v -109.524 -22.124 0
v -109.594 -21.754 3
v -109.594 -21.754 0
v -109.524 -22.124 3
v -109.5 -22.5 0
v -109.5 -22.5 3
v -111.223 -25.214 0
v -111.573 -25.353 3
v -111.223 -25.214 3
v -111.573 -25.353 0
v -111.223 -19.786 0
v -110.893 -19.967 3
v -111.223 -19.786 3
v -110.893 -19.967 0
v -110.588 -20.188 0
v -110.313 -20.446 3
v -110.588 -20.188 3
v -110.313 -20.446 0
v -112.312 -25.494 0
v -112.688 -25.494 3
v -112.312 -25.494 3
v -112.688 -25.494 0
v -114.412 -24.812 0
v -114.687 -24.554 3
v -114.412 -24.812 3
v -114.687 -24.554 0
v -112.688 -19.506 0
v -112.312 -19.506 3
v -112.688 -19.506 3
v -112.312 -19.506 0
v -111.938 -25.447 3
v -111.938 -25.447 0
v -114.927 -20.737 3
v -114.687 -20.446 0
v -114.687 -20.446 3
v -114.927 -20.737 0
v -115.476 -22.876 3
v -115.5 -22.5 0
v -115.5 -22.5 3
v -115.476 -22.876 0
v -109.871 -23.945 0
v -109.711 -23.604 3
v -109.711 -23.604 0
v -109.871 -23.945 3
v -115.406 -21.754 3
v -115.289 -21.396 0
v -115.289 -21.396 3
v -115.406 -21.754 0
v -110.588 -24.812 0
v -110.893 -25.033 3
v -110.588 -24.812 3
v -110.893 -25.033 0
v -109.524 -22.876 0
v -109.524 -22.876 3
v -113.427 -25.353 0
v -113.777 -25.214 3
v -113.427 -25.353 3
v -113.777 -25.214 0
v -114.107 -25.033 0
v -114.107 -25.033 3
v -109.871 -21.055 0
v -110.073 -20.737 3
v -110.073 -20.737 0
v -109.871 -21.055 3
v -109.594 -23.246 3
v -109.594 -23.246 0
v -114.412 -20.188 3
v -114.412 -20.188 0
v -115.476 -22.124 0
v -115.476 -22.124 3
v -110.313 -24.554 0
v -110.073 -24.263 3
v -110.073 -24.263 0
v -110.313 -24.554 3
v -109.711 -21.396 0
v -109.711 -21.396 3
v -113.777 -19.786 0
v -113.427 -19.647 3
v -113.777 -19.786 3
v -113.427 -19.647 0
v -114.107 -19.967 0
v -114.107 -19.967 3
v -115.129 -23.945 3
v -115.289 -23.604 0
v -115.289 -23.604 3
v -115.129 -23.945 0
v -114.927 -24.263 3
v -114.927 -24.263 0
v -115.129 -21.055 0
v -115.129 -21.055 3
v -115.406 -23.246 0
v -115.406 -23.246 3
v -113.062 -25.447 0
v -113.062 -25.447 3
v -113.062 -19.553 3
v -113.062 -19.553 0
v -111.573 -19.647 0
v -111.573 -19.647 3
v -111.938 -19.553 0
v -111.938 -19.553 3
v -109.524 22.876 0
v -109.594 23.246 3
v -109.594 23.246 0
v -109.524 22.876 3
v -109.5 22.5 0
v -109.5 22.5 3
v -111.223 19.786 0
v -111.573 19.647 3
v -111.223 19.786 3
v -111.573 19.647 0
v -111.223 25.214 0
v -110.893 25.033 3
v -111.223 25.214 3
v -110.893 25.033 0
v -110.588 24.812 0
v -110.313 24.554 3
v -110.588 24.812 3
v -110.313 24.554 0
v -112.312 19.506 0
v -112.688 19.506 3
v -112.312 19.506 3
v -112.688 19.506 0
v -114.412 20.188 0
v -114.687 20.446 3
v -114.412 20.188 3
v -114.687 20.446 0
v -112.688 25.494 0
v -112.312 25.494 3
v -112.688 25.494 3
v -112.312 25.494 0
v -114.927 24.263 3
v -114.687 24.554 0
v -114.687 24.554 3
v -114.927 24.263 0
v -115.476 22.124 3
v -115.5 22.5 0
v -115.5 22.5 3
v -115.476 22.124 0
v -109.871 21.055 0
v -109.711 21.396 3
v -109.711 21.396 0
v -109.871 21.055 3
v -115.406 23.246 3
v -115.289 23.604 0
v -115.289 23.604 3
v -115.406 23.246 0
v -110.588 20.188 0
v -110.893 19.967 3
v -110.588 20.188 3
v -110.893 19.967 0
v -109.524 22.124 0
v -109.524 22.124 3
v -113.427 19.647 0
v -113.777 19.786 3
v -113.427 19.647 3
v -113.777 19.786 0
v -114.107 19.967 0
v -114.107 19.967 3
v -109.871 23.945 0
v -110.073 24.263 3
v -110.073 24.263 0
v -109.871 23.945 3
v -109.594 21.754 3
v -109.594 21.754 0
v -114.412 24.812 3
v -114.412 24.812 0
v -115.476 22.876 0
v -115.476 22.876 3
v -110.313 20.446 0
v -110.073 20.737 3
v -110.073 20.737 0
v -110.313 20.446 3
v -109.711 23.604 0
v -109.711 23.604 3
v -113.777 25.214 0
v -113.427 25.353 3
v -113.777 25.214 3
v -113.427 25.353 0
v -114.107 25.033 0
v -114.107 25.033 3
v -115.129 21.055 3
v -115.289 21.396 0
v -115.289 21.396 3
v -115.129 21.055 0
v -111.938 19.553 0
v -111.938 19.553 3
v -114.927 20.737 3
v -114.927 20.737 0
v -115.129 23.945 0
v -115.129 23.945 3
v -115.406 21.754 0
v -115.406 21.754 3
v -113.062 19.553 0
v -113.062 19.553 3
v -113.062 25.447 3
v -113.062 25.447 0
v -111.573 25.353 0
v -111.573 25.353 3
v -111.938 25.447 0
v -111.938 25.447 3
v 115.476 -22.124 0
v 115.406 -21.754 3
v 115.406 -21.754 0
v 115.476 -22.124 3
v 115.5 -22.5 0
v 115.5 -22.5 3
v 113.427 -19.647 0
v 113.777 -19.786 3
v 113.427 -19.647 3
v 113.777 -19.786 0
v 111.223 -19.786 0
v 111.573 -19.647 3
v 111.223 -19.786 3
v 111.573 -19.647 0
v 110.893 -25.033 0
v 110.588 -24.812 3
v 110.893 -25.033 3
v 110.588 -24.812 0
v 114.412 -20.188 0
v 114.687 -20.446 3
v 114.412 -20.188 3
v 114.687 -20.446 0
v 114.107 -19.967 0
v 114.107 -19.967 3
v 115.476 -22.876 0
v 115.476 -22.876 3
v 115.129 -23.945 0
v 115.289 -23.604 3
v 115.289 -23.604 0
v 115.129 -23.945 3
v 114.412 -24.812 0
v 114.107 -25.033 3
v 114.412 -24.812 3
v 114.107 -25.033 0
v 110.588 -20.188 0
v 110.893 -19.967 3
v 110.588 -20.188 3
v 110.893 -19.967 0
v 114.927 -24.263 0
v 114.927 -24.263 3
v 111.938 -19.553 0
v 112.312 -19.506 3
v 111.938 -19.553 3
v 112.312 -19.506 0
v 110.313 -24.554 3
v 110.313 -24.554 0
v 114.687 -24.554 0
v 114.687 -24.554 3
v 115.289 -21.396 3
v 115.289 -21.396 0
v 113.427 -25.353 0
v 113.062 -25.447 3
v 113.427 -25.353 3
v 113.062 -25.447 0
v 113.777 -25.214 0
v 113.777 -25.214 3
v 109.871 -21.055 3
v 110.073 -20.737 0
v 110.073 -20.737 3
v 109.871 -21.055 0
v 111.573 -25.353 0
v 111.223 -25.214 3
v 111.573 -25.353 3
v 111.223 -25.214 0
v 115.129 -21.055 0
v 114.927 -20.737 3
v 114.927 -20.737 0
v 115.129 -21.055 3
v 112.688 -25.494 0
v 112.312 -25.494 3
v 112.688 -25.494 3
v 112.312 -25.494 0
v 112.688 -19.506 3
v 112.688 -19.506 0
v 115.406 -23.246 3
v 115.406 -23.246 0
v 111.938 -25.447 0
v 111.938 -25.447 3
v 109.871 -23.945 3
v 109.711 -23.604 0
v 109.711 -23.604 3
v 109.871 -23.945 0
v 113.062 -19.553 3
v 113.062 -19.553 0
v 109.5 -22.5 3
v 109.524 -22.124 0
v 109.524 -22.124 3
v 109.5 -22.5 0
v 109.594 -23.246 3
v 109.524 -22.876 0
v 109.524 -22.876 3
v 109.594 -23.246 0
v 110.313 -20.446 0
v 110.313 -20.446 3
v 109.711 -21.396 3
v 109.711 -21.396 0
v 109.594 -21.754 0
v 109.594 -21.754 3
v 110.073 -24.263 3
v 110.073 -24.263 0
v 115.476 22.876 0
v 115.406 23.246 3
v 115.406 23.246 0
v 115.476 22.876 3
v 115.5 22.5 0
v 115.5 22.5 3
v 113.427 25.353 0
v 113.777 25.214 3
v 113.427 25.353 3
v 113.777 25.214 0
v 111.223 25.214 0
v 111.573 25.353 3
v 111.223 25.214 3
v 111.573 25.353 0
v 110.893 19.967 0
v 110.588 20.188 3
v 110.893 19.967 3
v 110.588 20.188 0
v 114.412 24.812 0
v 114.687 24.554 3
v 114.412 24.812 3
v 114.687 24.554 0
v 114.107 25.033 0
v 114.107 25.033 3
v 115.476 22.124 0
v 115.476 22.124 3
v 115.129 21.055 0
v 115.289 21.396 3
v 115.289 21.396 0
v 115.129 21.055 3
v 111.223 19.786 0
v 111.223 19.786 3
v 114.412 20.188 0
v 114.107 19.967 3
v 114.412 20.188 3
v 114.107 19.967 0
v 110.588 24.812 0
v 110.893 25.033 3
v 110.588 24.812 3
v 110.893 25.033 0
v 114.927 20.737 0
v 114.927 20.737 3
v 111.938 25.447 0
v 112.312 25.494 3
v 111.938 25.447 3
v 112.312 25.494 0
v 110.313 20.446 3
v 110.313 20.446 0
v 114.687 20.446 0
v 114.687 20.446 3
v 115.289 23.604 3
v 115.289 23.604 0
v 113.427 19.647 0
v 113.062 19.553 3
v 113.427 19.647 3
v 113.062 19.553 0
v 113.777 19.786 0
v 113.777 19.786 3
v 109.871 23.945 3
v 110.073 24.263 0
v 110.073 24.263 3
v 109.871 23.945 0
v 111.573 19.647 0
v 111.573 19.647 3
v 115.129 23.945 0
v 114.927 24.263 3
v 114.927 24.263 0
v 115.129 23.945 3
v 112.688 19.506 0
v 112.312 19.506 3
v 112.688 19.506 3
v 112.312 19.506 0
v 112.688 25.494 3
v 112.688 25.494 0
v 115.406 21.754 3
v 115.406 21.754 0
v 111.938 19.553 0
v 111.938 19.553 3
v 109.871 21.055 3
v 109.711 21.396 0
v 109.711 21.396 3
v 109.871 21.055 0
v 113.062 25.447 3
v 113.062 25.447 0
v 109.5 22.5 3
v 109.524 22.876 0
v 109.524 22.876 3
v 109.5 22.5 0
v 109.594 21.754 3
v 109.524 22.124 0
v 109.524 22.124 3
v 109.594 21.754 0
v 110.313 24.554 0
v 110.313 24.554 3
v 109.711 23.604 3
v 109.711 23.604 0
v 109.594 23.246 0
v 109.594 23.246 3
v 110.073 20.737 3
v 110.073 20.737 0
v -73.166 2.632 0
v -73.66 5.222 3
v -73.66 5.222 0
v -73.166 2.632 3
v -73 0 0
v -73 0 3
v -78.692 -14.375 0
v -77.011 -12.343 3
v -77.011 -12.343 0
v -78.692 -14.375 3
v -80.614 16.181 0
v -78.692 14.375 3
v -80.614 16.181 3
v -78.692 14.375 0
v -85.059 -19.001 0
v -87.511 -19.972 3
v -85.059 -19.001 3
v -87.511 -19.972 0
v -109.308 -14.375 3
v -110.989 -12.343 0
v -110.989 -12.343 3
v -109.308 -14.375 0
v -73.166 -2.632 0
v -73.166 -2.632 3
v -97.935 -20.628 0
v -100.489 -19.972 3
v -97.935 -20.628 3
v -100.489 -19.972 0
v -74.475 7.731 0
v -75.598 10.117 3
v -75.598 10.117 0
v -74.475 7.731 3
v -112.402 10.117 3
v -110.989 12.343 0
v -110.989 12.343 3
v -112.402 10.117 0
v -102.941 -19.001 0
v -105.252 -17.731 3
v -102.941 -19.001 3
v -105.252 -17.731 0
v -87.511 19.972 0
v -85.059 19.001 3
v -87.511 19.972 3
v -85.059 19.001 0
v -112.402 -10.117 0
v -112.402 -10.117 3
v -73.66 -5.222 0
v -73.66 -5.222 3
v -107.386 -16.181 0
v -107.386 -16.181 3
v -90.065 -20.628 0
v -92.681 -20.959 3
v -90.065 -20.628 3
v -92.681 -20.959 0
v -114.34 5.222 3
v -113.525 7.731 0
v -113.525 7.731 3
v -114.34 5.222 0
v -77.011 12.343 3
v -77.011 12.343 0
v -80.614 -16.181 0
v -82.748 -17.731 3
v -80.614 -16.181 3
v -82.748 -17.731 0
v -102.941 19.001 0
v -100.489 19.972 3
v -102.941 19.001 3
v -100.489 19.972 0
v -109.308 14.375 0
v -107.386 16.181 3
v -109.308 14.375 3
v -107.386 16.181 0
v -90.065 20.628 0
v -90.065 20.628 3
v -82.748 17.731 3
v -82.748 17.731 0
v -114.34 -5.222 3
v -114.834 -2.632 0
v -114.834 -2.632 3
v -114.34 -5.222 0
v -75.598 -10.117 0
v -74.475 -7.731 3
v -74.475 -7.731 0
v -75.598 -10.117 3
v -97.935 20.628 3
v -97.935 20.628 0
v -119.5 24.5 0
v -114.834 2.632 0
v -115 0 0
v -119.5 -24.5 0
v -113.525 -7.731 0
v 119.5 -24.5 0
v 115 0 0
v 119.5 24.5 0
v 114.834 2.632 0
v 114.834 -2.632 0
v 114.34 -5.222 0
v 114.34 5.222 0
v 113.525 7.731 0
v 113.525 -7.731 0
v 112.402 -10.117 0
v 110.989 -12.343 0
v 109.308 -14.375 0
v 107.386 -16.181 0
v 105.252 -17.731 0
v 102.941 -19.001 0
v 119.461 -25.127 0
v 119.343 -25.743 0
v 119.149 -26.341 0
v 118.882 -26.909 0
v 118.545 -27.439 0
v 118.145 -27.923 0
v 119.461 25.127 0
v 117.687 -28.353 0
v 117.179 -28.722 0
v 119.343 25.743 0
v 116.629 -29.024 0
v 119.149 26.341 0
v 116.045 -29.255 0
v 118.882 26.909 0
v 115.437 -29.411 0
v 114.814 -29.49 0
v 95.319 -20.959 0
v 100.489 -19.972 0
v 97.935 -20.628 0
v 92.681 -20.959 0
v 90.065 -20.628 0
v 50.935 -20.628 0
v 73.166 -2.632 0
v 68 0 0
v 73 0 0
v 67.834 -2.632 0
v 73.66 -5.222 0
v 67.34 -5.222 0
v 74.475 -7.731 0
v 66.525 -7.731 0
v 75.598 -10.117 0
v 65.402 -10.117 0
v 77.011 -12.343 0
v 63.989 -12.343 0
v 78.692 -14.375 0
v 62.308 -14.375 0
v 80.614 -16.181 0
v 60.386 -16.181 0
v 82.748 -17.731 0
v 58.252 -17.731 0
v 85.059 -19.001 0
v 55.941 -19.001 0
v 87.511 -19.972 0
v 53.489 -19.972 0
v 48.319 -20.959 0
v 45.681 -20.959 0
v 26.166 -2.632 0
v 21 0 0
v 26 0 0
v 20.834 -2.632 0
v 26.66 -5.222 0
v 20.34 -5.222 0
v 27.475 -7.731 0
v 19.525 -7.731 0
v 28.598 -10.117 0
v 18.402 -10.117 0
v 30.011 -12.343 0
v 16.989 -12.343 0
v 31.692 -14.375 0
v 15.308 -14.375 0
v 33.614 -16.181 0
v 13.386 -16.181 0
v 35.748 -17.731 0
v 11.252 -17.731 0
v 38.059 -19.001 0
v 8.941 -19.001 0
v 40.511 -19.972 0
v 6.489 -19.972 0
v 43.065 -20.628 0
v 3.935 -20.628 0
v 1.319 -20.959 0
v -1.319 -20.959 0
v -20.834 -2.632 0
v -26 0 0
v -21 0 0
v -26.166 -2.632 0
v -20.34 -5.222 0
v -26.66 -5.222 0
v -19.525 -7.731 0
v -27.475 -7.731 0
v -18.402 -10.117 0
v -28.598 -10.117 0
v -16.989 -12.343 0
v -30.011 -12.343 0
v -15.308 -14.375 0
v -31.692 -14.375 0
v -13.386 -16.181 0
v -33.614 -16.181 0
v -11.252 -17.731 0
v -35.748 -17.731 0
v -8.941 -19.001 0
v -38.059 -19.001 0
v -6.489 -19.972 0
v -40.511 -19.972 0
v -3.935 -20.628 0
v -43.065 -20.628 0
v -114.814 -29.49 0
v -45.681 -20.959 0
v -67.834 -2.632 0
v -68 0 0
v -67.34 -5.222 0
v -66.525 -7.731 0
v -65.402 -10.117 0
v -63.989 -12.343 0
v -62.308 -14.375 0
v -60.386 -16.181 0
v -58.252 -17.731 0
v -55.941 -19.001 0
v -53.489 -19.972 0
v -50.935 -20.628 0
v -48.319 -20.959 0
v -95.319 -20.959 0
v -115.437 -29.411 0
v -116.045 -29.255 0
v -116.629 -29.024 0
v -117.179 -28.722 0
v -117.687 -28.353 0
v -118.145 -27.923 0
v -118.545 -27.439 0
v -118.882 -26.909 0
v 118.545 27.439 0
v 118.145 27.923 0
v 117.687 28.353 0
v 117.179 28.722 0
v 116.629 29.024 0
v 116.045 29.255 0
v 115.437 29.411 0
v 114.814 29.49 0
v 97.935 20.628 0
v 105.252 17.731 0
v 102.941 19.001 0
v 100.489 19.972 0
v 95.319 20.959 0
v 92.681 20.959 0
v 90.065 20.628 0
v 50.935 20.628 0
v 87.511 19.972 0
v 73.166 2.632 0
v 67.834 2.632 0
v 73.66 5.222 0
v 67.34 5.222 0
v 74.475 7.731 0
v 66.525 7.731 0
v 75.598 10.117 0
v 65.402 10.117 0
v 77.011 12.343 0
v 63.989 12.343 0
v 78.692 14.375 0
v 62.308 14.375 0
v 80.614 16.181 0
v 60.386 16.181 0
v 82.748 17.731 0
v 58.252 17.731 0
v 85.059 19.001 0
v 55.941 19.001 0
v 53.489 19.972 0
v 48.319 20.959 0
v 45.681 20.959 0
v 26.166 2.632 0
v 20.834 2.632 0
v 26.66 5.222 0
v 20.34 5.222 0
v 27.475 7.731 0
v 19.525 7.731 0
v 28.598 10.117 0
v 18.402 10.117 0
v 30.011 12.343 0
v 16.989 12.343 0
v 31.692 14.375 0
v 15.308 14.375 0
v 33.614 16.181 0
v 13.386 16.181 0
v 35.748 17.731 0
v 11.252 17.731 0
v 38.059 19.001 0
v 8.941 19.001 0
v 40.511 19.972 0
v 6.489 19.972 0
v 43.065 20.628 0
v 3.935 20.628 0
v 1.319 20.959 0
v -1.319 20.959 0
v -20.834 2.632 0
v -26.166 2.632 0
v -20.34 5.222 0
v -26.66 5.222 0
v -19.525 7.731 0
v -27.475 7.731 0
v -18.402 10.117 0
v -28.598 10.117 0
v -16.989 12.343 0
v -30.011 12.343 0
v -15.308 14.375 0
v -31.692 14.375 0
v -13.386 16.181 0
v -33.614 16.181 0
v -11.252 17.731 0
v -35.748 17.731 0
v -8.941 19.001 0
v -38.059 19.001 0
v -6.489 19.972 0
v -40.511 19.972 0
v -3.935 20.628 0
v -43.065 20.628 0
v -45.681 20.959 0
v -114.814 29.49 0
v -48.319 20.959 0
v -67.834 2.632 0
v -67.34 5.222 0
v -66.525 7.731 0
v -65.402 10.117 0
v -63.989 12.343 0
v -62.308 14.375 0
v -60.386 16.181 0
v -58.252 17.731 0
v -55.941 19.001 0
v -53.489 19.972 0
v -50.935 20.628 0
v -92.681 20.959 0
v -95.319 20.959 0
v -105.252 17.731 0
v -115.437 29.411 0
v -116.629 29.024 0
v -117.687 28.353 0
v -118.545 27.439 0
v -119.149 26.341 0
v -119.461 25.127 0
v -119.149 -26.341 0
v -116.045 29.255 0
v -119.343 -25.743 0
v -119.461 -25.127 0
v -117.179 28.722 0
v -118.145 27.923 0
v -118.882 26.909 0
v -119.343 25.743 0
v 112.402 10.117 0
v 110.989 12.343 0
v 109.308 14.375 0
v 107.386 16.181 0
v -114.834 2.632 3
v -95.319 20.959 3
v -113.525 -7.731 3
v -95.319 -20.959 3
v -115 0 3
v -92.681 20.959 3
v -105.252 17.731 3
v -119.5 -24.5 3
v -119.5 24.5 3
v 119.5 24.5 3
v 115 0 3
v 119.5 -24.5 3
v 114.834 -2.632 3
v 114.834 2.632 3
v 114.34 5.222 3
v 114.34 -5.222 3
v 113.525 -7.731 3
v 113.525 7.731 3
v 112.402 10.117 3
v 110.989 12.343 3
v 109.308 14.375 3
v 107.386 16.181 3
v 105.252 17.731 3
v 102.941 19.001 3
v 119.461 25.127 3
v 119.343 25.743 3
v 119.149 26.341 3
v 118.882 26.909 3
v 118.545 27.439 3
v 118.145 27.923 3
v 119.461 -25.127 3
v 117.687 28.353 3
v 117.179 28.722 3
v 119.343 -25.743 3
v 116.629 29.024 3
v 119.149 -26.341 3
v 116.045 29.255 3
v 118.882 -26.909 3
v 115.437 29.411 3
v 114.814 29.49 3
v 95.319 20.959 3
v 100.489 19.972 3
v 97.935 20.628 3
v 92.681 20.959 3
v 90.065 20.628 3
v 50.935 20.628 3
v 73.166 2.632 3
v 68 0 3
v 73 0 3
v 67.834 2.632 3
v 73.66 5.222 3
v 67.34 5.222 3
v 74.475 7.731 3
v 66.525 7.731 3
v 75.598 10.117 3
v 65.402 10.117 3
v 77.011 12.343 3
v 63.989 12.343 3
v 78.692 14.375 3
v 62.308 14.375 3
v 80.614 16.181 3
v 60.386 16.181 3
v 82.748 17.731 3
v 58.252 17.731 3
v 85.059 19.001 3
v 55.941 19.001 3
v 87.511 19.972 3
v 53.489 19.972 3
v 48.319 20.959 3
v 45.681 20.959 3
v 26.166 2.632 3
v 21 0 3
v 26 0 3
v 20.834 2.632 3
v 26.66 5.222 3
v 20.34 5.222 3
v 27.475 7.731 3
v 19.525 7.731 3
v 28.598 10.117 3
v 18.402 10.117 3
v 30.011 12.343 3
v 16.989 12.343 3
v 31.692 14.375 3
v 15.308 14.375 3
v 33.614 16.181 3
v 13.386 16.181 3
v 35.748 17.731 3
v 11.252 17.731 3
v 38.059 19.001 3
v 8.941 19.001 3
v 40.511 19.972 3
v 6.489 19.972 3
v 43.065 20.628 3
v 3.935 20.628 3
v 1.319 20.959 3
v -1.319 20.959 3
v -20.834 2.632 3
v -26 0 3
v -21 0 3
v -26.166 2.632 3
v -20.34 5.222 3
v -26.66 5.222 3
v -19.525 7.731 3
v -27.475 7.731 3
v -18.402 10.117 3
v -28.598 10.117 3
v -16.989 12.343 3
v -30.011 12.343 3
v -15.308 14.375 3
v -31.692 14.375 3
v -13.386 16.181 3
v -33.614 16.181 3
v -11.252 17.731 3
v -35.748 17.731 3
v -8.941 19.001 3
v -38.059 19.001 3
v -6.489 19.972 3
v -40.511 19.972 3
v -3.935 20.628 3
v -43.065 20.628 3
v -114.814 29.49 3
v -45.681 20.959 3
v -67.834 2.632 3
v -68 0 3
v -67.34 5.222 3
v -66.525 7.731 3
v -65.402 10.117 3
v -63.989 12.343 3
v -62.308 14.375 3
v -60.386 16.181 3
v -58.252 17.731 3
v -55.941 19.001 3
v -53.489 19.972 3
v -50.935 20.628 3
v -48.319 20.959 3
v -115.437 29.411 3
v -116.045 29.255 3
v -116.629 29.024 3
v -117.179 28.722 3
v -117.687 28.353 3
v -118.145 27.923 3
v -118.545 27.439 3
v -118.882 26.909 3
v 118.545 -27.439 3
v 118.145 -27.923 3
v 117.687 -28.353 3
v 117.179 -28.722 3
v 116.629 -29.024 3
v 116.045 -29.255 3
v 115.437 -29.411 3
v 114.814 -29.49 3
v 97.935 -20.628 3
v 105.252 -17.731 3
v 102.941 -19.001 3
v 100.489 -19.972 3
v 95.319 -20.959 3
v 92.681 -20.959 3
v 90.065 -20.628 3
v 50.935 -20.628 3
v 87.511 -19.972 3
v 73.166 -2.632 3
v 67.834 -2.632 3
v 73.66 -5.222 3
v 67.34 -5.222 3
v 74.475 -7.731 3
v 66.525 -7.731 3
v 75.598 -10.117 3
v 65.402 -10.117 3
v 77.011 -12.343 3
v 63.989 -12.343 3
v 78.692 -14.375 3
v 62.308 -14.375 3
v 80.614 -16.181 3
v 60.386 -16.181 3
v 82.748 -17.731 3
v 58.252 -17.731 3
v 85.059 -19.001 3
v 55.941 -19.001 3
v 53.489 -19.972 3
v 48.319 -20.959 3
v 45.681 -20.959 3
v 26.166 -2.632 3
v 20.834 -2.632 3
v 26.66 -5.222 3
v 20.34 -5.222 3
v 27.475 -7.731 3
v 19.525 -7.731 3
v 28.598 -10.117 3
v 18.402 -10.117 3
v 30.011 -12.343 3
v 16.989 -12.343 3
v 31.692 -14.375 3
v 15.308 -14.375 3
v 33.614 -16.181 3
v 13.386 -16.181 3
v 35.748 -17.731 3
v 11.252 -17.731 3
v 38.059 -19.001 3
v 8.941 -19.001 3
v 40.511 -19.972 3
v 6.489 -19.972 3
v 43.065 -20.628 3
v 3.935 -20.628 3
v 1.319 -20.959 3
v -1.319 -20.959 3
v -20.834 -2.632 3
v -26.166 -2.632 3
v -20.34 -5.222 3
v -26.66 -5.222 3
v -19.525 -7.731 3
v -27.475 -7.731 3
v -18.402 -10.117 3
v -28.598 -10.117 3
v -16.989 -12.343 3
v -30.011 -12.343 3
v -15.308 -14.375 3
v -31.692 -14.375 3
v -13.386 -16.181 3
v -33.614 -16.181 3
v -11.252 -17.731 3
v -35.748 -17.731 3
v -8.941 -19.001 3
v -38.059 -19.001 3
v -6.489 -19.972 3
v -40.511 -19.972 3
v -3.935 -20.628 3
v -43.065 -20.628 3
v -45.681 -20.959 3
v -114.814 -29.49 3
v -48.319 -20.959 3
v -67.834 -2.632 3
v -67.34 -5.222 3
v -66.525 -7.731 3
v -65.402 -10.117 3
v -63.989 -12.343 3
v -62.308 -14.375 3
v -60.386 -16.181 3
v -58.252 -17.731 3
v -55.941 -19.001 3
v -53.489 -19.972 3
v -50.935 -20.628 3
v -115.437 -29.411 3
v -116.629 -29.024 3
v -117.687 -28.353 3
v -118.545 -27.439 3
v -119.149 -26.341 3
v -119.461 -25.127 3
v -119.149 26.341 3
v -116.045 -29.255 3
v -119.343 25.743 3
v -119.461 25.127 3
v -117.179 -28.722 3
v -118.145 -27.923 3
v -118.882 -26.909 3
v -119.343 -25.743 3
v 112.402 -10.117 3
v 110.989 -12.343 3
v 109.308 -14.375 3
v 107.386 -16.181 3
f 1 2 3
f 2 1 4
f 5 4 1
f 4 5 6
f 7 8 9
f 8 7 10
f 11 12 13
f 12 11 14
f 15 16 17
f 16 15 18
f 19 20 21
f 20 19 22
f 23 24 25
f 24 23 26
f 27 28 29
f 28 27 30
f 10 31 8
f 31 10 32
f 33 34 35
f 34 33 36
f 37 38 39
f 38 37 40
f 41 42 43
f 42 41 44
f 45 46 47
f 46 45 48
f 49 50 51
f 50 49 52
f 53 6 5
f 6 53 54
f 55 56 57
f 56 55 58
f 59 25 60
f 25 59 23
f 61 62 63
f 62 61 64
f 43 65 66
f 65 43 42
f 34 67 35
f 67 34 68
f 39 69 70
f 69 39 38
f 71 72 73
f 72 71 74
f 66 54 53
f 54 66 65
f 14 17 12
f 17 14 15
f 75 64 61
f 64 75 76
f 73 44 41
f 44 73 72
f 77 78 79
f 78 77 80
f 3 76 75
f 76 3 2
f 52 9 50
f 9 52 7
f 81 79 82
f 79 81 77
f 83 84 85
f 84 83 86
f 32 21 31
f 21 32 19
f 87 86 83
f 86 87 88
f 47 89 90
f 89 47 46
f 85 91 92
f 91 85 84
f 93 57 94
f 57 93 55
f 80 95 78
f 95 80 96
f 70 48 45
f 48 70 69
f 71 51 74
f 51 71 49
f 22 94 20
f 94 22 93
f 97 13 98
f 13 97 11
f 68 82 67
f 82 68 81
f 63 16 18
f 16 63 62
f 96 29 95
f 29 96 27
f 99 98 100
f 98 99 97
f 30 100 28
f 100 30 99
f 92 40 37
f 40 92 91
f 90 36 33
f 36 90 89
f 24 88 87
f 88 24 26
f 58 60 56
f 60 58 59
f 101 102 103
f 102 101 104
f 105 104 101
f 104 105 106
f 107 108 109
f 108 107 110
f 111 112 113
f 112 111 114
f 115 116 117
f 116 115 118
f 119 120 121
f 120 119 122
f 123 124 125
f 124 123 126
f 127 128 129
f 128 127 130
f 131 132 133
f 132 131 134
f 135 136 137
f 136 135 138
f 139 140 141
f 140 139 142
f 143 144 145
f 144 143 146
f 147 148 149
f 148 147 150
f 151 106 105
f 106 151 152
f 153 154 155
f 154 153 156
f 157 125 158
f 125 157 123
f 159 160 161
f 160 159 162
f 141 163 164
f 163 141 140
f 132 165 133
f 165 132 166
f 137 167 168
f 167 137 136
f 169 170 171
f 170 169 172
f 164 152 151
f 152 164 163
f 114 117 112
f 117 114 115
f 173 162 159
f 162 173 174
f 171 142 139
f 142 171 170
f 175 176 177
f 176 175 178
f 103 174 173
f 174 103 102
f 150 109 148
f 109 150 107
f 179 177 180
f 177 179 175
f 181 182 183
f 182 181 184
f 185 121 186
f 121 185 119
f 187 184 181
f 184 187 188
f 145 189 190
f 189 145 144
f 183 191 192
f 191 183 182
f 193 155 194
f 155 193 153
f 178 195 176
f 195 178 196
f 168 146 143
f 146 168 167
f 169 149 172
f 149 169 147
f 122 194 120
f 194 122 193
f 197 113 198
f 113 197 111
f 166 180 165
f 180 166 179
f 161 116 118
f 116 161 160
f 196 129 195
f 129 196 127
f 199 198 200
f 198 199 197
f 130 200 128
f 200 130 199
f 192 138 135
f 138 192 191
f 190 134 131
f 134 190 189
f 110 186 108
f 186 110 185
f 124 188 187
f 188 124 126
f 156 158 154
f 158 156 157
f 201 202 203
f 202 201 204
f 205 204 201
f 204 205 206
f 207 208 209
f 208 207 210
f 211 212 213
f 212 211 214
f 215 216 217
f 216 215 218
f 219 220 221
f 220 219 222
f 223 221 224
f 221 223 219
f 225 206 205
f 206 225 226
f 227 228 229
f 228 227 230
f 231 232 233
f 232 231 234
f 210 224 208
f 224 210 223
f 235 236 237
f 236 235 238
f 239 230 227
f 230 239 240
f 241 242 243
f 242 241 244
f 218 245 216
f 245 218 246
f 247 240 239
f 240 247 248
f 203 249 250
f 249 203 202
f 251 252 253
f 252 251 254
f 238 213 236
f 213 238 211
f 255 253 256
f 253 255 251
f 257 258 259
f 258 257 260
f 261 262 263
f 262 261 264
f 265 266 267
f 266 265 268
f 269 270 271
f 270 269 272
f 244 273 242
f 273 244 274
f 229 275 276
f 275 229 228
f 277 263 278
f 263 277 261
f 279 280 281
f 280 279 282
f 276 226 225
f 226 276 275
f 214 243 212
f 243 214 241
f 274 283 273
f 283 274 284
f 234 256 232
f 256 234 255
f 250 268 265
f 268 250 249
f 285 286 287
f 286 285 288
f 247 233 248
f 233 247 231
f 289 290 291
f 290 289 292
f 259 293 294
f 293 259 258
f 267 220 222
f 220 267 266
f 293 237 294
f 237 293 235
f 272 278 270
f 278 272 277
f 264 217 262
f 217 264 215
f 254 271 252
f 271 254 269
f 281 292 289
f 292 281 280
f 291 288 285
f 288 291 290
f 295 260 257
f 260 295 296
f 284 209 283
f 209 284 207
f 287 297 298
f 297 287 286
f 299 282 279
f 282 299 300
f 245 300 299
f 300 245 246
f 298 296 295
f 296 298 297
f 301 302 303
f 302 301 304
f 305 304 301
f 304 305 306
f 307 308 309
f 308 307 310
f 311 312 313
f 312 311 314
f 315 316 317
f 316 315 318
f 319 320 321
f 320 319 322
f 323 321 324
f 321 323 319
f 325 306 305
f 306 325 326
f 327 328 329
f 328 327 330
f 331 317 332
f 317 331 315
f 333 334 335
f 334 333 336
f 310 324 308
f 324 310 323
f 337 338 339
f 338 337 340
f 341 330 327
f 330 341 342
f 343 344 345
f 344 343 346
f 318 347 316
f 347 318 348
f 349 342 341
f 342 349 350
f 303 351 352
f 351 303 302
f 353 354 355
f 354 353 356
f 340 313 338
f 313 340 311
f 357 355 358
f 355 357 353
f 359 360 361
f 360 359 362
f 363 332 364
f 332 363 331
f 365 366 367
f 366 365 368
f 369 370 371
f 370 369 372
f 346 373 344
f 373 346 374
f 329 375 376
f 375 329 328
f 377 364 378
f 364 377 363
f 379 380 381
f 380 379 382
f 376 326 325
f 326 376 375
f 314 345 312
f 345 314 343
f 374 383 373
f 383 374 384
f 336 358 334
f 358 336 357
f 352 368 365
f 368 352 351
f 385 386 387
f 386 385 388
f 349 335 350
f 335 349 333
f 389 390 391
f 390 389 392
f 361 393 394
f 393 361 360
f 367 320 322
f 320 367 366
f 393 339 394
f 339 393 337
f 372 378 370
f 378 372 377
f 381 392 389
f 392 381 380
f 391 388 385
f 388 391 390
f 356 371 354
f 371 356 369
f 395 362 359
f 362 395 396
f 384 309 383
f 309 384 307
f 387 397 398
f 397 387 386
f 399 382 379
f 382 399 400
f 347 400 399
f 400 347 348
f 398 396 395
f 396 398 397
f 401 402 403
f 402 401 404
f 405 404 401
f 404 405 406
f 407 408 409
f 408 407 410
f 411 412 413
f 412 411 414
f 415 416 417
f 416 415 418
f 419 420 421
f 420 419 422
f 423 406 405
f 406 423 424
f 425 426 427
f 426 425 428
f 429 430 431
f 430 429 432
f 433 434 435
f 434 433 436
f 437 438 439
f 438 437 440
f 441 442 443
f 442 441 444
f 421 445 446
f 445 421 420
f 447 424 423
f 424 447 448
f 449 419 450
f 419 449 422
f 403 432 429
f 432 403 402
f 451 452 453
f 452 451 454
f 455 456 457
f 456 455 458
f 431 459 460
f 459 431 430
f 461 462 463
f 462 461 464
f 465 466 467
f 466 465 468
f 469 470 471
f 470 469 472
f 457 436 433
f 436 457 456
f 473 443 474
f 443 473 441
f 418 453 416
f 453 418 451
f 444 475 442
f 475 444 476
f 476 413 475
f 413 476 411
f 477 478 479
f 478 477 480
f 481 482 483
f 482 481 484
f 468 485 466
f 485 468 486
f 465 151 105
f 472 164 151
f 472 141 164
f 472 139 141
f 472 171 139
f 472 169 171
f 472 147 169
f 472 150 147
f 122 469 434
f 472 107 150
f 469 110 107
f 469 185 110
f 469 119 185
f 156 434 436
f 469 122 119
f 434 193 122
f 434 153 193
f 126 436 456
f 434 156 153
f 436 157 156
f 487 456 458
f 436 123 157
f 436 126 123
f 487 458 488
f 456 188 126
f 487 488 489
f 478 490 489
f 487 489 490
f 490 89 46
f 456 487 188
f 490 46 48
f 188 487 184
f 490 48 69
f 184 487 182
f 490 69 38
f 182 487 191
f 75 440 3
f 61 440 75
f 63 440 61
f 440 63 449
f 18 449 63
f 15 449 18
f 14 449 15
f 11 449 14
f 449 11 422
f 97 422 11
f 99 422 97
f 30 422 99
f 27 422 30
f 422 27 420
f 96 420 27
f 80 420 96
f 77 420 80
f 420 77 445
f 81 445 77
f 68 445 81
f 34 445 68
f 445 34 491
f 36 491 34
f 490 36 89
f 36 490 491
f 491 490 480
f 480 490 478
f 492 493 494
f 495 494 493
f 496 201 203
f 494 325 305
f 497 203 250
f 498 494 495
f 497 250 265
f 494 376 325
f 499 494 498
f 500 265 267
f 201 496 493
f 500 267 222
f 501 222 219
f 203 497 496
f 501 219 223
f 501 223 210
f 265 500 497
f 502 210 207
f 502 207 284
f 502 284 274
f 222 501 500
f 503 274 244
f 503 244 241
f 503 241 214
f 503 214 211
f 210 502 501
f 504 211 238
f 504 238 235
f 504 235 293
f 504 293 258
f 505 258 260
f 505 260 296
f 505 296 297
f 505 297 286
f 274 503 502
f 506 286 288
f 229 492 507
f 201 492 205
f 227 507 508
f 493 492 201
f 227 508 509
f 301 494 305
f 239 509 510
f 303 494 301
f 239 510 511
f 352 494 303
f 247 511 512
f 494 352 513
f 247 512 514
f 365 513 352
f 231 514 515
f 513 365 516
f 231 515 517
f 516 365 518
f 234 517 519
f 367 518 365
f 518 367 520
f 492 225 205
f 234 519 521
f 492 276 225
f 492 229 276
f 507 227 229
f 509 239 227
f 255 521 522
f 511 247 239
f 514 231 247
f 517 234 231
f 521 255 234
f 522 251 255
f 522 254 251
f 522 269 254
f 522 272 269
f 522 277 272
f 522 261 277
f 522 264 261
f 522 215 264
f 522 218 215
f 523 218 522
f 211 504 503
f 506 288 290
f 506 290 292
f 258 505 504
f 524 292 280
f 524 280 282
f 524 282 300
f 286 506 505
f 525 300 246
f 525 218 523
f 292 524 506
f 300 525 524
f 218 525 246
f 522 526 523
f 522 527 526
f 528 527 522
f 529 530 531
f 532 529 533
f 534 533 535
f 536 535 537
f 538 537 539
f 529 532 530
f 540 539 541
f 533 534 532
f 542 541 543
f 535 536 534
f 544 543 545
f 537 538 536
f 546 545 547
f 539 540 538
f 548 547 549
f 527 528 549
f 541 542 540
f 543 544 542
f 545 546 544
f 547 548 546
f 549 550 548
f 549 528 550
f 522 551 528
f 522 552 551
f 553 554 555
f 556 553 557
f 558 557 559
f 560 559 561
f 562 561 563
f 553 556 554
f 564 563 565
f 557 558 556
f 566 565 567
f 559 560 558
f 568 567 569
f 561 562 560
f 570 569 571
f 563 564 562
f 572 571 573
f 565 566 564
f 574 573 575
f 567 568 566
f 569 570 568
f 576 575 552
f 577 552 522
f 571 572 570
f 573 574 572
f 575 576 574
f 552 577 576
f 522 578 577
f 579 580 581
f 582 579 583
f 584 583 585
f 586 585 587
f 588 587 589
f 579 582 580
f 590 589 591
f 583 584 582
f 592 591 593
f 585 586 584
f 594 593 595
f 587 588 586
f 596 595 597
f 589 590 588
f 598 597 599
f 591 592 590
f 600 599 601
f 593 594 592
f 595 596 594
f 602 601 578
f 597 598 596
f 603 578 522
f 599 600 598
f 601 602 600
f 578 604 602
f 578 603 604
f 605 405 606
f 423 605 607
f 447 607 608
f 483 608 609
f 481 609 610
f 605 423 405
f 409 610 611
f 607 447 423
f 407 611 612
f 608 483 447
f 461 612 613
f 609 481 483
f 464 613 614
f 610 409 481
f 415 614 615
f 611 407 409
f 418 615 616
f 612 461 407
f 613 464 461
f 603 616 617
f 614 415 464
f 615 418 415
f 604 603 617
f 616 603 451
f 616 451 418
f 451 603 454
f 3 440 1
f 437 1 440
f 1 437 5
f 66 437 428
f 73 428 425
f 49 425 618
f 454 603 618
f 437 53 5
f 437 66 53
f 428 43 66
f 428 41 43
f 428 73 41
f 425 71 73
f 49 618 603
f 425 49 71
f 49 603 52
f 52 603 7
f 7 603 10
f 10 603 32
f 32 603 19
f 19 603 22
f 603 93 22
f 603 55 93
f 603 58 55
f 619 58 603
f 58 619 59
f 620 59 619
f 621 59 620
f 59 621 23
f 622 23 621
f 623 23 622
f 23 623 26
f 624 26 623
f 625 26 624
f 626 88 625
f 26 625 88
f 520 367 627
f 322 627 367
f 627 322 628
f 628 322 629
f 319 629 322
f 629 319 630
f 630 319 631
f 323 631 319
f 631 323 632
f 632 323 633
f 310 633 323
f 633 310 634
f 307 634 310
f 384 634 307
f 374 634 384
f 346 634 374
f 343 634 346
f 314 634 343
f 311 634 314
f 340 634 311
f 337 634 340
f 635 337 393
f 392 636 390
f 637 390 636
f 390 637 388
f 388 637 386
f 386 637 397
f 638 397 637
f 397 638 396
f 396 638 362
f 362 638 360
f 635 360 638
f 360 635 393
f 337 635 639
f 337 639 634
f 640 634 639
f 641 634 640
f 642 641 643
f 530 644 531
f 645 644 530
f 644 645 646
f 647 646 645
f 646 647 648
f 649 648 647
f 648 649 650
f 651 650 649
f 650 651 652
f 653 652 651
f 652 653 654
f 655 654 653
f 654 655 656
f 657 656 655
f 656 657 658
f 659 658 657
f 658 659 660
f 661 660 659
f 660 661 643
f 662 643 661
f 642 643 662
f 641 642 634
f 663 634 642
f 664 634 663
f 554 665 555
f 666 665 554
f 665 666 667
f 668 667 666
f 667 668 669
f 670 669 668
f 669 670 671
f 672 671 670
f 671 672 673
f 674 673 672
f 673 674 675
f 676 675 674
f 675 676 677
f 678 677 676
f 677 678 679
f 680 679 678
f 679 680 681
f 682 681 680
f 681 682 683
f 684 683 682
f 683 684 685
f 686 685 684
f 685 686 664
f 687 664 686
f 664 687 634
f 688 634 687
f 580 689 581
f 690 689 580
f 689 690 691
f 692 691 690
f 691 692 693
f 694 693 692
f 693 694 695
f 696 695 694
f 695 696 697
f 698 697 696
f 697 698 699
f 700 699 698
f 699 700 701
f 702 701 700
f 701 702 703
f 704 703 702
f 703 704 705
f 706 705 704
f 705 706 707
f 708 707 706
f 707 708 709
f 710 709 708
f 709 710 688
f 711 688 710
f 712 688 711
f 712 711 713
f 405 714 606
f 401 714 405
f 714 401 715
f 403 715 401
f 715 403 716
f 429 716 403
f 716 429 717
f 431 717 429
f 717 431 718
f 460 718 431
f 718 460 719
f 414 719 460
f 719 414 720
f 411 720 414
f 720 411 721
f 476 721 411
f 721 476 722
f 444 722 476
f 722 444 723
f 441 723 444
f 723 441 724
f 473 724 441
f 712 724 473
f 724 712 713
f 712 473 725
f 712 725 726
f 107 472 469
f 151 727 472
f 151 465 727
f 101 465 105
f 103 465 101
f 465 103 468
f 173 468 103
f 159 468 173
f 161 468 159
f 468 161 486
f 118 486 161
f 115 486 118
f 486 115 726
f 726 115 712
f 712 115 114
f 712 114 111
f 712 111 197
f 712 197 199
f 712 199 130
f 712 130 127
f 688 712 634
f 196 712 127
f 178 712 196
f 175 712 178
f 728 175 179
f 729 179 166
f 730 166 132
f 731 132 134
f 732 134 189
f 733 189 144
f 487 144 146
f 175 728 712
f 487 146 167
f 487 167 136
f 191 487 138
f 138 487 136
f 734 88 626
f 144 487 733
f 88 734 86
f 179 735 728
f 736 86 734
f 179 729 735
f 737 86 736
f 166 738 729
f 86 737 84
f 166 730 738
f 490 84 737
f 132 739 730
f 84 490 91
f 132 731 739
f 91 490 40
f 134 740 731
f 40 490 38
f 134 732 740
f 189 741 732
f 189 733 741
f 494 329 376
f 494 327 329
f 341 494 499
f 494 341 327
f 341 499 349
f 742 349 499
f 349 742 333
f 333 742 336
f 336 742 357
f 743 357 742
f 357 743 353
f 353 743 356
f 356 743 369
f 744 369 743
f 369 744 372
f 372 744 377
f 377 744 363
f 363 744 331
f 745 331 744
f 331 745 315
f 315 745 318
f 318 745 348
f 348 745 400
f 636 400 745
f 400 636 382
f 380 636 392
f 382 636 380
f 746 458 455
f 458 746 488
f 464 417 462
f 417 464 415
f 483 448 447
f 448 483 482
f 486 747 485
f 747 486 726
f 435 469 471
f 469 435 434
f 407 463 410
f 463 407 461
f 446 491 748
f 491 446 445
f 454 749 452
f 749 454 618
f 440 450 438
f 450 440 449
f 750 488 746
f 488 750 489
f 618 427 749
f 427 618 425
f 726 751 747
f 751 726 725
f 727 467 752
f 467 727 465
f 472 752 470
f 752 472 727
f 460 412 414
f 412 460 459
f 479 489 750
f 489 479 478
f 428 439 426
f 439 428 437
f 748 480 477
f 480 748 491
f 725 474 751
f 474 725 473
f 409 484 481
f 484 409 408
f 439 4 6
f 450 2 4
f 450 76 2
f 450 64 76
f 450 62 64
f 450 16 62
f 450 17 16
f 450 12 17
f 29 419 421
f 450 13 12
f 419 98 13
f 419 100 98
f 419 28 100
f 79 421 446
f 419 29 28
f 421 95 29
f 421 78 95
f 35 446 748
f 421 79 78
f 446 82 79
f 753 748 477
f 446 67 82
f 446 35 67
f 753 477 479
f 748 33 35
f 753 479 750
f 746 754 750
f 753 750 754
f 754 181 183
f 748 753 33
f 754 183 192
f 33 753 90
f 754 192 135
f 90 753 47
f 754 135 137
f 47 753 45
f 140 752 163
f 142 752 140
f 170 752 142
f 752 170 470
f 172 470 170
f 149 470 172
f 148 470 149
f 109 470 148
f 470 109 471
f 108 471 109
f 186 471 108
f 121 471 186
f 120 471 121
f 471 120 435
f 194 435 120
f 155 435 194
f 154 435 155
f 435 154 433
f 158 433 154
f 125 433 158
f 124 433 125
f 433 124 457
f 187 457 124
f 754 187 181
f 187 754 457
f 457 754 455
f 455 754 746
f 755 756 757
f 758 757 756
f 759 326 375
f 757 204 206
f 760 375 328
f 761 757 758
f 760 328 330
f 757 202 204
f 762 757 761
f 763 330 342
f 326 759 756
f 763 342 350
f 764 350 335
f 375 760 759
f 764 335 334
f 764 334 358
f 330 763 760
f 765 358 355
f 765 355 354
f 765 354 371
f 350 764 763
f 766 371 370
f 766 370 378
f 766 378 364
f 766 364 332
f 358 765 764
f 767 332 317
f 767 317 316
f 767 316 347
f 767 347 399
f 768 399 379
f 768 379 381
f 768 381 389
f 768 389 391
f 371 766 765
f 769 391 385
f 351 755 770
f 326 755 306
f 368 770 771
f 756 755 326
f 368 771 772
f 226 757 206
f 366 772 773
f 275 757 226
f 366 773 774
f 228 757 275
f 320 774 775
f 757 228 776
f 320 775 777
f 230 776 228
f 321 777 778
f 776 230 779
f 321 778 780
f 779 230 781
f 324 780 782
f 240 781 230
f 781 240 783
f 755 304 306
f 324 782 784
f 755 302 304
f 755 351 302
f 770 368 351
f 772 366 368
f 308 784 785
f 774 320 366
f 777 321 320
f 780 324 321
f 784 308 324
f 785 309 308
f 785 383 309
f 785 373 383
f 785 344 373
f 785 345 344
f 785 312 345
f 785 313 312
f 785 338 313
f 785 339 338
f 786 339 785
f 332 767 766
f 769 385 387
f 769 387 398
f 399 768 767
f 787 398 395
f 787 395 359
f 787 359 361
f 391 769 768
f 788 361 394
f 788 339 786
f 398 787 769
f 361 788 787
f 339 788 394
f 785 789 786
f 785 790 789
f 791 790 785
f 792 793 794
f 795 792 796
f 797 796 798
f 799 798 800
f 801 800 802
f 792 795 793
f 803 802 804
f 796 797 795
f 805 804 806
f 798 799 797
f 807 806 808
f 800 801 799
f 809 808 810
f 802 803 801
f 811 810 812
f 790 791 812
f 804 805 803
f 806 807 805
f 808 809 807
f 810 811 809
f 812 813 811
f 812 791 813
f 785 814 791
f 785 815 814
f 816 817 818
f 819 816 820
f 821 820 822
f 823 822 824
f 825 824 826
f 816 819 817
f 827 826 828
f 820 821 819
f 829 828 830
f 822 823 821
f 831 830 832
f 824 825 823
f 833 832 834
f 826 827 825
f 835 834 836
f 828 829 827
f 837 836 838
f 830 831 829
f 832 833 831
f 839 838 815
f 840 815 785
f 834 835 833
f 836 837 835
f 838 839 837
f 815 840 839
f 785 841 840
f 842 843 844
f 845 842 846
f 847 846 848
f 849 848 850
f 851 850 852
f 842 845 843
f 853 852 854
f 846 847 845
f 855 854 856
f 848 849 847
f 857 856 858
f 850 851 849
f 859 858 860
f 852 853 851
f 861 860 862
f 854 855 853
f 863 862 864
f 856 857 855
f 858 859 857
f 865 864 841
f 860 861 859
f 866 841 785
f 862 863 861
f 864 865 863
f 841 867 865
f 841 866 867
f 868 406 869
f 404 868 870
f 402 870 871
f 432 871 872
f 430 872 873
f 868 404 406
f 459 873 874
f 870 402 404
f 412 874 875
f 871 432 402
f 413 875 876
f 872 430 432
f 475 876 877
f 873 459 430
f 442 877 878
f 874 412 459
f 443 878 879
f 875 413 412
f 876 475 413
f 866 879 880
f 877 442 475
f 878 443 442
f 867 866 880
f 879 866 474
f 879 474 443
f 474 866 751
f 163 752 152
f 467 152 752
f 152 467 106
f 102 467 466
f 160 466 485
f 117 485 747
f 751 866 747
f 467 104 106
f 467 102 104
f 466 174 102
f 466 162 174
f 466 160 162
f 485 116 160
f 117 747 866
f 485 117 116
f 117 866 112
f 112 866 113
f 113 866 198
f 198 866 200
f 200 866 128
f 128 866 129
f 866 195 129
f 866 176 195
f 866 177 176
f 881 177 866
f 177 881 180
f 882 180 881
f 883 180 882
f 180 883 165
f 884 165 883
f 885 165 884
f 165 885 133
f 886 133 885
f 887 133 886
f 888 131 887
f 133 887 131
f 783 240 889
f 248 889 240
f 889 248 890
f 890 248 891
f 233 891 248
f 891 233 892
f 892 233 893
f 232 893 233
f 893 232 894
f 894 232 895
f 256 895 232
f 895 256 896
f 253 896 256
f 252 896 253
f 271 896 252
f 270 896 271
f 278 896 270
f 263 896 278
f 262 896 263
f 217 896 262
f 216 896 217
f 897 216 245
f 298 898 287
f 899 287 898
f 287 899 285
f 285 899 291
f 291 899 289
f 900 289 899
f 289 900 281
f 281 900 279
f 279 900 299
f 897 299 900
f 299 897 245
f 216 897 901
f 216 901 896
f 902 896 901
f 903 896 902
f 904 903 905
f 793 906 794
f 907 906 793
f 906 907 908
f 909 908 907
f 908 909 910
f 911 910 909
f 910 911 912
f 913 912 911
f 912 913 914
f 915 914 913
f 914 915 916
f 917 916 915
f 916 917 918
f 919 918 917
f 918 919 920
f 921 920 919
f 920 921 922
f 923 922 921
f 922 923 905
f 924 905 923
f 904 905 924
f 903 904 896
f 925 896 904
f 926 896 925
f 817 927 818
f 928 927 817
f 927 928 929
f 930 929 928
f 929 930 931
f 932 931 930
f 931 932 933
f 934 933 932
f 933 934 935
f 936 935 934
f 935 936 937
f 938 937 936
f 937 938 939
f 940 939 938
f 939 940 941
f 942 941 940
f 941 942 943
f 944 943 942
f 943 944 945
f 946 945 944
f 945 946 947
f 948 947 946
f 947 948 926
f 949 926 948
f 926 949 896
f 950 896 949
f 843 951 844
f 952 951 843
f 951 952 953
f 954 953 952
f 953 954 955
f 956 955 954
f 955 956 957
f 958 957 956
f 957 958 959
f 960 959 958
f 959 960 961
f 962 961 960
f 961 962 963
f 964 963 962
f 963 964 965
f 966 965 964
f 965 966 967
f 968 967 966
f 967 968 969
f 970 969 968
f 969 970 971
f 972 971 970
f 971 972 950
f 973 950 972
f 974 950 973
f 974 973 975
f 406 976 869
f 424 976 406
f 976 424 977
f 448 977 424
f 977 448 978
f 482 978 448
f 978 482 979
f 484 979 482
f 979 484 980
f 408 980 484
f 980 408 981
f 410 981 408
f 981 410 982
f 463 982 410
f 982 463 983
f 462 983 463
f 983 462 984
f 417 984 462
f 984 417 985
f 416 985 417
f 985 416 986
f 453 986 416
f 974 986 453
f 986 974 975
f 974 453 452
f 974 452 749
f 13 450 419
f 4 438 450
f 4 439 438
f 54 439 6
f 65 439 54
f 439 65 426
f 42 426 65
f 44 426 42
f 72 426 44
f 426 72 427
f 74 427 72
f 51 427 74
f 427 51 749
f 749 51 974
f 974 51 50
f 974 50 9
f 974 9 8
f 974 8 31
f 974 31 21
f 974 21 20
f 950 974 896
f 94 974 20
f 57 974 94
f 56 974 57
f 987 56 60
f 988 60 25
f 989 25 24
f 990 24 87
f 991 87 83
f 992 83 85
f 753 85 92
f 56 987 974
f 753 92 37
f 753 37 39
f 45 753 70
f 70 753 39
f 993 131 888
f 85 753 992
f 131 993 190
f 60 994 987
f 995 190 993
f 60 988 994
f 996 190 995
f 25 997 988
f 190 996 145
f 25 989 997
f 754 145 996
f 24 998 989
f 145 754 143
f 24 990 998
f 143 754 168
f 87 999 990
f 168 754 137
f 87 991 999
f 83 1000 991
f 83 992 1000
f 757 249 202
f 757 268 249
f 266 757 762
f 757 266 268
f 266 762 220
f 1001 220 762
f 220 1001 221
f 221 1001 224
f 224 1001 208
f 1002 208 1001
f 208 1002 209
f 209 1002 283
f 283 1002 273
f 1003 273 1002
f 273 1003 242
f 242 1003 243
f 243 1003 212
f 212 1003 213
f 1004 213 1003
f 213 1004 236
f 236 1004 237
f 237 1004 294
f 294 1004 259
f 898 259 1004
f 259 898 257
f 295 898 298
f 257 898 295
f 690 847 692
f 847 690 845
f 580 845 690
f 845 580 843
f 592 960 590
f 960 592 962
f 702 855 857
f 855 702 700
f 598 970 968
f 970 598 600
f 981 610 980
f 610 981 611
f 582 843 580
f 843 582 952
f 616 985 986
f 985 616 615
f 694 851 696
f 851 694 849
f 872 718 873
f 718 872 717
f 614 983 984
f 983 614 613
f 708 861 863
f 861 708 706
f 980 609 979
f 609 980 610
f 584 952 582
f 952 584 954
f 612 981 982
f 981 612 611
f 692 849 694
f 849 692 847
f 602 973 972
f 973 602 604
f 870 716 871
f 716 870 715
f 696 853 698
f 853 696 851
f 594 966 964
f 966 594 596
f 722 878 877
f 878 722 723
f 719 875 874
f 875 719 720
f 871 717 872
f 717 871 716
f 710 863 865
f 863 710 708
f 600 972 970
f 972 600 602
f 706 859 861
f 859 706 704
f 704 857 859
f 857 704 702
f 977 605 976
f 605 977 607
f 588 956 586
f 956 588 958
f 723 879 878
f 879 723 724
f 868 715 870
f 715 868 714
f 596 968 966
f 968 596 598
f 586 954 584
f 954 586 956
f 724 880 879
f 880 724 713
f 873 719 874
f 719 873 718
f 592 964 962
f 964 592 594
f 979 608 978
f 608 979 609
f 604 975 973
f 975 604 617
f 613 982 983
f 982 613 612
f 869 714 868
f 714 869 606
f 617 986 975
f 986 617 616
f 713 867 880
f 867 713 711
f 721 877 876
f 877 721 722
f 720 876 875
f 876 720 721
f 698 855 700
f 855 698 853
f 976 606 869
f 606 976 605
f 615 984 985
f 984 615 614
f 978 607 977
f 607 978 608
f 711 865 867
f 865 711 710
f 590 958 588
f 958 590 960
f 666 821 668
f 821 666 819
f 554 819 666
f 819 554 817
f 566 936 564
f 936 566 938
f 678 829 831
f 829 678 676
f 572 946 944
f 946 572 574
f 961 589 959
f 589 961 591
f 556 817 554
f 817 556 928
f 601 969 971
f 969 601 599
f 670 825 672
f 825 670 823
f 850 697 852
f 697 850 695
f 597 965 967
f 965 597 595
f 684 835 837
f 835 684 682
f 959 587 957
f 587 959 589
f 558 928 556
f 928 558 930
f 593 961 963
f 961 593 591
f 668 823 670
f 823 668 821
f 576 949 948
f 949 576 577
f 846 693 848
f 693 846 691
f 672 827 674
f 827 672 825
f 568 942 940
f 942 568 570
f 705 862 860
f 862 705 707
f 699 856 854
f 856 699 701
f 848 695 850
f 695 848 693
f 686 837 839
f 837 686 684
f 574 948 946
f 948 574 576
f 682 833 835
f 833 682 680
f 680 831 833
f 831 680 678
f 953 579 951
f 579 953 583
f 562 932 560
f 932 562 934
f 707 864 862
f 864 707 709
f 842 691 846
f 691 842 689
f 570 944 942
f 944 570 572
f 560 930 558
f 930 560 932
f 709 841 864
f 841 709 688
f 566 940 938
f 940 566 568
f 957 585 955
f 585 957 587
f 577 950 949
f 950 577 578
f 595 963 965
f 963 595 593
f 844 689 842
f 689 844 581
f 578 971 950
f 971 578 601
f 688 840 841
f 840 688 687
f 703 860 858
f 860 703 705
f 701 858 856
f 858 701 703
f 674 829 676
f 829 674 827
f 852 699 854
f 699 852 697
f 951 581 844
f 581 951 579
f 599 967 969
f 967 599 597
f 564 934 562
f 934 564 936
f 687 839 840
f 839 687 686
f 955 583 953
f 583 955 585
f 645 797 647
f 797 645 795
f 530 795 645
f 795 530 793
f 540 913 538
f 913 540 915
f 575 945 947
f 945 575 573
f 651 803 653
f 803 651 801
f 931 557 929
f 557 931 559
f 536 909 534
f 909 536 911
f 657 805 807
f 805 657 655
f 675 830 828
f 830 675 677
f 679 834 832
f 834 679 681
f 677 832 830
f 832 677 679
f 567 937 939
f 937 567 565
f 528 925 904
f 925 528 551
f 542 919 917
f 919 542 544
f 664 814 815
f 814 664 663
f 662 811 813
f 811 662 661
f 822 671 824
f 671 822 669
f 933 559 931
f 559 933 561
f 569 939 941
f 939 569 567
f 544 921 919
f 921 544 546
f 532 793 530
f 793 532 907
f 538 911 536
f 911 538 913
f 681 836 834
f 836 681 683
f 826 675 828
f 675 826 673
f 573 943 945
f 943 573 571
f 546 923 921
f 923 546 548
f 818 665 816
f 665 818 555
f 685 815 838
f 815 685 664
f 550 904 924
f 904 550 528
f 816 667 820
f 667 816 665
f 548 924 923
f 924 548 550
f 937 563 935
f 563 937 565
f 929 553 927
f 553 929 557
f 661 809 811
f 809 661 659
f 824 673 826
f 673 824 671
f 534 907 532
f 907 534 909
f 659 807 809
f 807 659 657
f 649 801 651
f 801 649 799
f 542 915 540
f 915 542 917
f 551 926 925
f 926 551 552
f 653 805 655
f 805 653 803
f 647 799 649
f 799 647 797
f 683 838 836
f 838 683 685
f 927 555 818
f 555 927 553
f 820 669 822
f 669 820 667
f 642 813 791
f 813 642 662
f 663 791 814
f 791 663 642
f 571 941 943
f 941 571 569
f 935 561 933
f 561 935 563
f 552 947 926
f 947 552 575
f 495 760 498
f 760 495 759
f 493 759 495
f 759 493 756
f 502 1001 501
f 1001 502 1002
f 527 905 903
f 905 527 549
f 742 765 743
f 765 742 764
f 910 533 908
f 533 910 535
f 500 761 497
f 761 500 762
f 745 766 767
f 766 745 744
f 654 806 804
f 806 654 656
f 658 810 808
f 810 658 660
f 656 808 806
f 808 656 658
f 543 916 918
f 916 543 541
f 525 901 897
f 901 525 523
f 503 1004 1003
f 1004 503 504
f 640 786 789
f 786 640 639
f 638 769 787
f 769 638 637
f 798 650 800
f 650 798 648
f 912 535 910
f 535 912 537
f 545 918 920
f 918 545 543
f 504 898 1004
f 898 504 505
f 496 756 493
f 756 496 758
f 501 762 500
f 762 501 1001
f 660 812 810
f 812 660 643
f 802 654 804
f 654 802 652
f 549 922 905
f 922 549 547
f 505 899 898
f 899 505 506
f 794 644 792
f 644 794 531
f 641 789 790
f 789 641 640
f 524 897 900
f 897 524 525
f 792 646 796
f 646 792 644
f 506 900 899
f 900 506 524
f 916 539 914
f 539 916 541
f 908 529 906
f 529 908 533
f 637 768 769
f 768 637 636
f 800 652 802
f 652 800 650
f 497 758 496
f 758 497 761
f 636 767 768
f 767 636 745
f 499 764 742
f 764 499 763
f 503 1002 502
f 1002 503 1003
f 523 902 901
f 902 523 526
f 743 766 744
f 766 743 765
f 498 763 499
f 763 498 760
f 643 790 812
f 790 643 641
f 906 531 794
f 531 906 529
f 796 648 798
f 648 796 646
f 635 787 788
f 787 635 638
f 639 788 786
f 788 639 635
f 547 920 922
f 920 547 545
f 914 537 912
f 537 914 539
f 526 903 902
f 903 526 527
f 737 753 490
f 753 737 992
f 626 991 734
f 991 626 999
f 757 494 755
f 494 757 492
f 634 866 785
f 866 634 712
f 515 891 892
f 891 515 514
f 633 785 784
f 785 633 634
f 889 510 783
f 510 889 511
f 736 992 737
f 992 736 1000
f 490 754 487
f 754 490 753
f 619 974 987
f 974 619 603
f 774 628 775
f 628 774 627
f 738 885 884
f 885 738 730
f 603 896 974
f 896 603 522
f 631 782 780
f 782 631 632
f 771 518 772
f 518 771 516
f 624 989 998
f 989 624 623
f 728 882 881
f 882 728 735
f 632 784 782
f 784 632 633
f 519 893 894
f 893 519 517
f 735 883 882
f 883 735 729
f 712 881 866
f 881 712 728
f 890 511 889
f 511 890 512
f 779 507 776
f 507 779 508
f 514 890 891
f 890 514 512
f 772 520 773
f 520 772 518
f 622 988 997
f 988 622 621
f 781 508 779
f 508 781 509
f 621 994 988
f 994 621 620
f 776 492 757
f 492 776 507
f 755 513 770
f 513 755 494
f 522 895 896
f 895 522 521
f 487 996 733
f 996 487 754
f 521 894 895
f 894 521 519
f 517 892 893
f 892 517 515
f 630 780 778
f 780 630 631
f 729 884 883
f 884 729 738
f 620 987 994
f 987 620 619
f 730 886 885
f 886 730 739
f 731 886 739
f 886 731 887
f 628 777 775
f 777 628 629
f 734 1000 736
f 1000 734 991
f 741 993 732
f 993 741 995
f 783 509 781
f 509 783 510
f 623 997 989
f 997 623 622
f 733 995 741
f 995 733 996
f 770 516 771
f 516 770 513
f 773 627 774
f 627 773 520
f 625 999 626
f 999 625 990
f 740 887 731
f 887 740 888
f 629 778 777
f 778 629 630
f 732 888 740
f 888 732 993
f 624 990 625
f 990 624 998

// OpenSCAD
$fn = 50;


difference() {
	union() {
		hull() {
			translate(v = [-114.5000000000, 24.5000000000, 0]) {
				cylinder(h = 3, r = 5);
			}
			translate(v = [114.5000000000, 24.5000000000, 0]) {
				cylinder(h = 3, r = 5);
			}
			translate(v = [-114.5000000000, -24.5000000000, 0]) {
				cylinder(h = 3, r = 5);
			}
			translate(v = [114.5000000000, -24.5000000000, 0]) {
				cylinder(h = 3, r = 5);
			}
		}
	}
	union() {
		#translate(v = [-112.5000000000, -22.5000000000, -100.0000000000]) {
			cylinder(h = 200, r = 3.0000000000);
		}
		#translate(v = [-112.5000000000, 22.5000000000, -100.0000000000]) {
			cylinder(h = 200, r = 3.0000000000);
		}
		#translate(v = [112.5000000000, -22.5000000000, -100.0000000000]) {
			cylinder(h = 200, r = 3.0000000000);
		}
		#translate(v = [112.5000000000, 22.5000000000, -100.0000000000]) {
			cylinder(h = 200, r = 3.0000000000);
		}
		#translate(v = [-94.0000000000, 0, 0]) {
			cylinder(h = 3, r = 21.0000000000);
		}
		#translate(v = [-47.0000000000, 0, 0]) {
			cylinder(h = 3, r = 21.0000000000);
		}
		#cylinder(h = 3, r = 21.0000000000);
		#translate(v = [47.0000000000, 0, 0]) {
			cylinder(h = 3, r = 21.0000000000);
		}
		#translate(v = [94.0000000000, 0, 0]) {
			cylinder(h = 3, r = 21.0000000000);
		}
	}
}
